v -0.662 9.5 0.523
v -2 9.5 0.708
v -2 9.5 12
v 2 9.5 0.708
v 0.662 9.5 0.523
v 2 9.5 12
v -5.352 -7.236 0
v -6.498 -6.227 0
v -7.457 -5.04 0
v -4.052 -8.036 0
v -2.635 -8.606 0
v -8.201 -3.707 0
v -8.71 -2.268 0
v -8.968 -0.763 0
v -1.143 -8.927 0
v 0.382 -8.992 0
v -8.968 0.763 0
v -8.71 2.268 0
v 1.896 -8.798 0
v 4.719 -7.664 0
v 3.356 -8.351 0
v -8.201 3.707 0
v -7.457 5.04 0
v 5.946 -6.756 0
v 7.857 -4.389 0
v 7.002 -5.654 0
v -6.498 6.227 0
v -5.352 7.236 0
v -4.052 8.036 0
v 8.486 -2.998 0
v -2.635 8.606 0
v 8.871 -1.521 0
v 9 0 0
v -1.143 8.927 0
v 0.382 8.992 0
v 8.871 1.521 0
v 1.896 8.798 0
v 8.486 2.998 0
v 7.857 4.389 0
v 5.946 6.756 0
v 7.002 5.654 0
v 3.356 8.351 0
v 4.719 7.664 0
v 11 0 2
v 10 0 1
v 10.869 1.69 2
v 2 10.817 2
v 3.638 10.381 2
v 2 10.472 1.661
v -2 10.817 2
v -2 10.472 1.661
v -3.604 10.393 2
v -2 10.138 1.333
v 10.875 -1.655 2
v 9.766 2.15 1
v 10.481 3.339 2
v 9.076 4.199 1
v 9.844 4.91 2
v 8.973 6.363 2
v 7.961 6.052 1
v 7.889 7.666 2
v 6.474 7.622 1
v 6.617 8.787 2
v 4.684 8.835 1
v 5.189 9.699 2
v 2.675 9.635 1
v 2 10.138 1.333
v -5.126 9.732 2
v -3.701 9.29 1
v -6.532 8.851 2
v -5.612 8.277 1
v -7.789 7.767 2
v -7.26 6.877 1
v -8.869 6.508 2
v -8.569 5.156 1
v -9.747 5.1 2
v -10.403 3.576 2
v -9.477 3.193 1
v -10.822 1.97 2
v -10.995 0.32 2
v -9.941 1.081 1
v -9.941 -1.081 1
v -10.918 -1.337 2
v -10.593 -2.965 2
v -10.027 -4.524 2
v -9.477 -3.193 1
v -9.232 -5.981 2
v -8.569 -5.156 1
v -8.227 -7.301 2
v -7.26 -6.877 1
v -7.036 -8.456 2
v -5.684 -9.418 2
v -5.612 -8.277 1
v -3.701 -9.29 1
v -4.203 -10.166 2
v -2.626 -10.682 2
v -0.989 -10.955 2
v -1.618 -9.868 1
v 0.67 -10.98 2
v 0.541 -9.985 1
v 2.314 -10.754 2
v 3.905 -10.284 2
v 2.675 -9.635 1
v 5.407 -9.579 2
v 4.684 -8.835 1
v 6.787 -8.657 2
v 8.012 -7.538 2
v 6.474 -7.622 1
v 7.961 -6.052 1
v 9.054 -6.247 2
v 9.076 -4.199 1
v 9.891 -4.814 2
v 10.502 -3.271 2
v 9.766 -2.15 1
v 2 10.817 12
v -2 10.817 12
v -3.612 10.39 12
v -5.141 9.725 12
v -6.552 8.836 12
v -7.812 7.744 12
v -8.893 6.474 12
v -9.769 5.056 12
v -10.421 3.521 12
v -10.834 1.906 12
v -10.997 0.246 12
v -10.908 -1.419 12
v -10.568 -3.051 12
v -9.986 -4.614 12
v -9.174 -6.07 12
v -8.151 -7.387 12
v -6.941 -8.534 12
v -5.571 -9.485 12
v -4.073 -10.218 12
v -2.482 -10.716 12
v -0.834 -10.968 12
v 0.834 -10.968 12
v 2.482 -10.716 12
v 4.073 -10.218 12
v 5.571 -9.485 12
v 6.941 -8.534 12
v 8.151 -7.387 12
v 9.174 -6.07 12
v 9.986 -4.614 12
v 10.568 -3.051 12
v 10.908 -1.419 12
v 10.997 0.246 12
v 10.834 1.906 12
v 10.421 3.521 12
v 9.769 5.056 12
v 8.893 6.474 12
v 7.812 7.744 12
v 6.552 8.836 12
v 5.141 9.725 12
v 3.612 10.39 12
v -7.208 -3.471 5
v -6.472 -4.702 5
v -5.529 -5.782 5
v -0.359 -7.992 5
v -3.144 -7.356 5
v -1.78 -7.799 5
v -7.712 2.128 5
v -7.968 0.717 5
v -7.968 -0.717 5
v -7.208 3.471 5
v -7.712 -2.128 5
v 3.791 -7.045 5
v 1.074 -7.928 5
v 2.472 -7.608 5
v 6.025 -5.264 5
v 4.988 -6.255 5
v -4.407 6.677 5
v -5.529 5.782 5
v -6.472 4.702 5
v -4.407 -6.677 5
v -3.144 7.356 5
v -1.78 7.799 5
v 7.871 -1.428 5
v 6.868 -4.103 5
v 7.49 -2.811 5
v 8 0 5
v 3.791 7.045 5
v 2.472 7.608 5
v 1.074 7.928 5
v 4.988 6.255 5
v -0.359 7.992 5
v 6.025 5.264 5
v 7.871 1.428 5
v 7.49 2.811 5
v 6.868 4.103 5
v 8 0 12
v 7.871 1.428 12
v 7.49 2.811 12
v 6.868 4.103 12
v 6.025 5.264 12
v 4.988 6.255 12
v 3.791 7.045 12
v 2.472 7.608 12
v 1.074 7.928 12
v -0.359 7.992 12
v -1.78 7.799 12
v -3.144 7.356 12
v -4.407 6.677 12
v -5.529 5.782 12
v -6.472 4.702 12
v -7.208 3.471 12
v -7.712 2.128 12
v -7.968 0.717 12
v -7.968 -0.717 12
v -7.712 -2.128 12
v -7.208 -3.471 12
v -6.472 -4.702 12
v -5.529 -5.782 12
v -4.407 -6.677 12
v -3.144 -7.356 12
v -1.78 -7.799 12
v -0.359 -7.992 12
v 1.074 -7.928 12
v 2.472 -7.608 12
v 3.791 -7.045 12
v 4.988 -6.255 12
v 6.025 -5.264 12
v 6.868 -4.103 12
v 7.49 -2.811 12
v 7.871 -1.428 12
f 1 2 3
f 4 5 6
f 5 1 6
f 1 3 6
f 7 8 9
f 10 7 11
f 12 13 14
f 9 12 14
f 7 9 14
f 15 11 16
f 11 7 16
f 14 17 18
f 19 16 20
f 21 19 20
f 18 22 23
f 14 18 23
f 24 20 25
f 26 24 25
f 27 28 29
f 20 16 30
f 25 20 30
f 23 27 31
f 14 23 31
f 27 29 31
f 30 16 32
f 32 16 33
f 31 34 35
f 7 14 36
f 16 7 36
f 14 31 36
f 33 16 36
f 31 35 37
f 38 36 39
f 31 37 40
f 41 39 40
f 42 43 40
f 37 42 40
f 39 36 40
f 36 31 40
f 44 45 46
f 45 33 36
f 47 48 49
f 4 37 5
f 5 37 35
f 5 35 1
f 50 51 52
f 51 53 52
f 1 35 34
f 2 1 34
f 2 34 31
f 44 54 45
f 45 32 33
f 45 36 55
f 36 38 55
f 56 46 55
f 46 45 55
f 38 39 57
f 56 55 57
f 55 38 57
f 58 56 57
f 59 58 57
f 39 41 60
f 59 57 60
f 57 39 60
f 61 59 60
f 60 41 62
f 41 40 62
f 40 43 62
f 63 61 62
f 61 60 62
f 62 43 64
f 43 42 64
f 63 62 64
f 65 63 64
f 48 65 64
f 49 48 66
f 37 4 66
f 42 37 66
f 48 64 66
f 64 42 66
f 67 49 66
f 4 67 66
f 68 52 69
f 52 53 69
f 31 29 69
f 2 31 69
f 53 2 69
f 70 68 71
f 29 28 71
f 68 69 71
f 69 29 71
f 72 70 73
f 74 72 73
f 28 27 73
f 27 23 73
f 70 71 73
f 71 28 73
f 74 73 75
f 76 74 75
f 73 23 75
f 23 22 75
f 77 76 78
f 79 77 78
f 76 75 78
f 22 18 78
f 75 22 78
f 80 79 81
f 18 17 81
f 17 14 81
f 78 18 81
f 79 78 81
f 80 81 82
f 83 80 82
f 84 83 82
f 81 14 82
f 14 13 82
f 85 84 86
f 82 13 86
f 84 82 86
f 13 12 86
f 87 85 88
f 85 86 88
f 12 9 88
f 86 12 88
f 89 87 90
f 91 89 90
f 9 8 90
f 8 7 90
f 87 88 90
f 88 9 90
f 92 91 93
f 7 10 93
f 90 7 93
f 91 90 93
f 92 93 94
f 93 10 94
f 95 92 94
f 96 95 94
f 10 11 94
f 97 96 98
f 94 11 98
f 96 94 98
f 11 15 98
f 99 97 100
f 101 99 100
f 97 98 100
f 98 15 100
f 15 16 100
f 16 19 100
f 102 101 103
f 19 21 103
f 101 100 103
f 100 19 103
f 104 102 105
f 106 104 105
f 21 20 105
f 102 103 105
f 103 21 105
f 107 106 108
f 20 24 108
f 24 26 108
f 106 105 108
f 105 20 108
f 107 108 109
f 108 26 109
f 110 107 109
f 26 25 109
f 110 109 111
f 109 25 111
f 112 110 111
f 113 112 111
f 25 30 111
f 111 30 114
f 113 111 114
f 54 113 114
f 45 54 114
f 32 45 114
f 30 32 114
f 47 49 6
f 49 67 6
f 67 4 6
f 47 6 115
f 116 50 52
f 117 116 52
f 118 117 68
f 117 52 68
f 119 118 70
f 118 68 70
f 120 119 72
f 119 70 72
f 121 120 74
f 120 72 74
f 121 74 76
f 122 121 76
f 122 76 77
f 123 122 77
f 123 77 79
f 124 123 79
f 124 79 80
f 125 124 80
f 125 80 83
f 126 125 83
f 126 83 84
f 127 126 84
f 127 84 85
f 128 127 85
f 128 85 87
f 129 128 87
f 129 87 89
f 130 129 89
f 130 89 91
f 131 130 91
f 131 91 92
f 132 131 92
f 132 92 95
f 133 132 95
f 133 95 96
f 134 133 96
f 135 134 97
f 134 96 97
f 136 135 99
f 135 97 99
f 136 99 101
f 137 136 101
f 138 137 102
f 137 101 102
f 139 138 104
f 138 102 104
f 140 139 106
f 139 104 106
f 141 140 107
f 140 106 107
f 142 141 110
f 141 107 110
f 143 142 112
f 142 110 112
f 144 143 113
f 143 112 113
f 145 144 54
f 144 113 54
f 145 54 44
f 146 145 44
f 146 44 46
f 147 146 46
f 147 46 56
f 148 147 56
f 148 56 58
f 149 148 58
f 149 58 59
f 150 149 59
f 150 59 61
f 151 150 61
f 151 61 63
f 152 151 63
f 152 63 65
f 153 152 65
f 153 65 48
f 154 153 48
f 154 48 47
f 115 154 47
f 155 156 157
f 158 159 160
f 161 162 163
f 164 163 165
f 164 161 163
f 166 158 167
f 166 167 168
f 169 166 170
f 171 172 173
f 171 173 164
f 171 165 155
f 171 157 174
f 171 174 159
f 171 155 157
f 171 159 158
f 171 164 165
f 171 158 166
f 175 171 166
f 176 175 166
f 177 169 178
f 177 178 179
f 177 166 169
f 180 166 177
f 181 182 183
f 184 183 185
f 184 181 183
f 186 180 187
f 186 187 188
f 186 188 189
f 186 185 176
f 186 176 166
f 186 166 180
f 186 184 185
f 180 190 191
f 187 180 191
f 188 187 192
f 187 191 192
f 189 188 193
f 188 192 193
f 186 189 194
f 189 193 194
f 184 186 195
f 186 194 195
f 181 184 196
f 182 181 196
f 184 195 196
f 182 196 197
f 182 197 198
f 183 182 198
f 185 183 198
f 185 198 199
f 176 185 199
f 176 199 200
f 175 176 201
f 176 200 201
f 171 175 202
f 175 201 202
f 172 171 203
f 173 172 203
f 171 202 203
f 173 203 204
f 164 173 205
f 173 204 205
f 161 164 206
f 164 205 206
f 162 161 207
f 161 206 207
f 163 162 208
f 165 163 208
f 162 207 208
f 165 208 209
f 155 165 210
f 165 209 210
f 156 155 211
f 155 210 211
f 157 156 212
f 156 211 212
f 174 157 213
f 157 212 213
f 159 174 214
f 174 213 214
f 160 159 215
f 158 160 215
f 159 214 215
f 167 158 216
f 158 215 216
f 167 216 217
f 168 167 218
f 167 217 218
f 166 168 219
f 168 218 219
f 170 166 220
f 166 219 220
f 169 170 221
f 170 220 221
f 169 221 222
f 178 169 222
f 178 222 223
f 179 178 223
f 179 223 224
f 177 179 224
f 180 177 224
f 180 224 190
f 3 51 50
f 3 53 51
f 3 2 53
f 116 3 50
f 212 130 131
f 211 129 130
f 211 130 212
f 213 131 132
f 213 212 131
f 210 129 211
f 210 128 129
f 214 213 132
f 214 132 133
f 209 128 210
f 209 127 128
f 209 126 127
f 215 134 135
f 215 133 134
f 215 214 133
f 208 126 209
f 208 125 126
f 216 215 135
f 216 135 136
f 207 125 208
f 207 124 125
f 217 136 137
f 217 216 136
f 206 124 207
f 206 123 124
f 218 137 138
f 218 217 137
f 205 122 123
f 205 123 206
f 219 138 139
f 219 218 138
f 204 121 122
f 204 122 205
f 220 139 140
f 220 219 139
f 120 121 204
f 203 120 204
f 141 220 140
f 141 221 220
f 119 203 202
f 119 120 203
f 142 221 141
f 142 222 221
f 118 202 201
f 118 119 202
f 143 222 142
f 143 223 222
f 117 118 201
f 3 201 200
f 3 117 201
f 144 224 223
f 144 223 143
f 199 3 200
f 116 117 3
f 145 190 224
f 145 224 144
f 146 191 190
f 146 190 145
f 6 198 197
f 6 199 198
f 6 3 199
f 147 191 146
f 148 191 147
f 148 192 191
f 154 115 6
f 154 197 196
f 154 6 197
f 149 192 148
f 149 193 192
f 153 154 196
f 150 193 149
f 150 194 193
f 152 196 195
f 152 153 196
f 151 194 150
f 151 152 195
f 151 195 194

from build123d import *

# Parameters (mm, degrees)
SKETCH1_R           = 11
BOSS_EXTRUDE1_DEPTH = 12
SKETCH2_R           = 8
CUT_EXTRUDE1_DEPTH  = 7
CHAMFER1_SIZE       = 2
SKETCH3_W           = 4
SKETCH3_H           = 3.288893808
CUT_EXTRUDE2_DEPTH  = 22


with BuildPart() as part:
    # Sketch1 → Boss-Extrude1 (new body)
    with BuildSketch(Plane.XY):
        Circle(SKETCH1_R)
    extrude(amount=BOSS_EXTRUDE1_DEPTH)

    # Sketch2 → Cut-Extrude1 (cut)
    with BuildSketch(Plane.XY.offset(12)):
        Circle(SKETCH2_R)
    extrude(amount=-CUT_EXTRUDE1_DEPTH, mode=Mode.SUBTRACT)

    # Chamfer1
    chamfer1_edges = [part.edges().sort_by_distance(p)[0] for p in [
        (-11, 0, 0),
    ]]
    chamfer(chamfer1_edges, length=CHAMFER1_SIZE)

    # Sketch3 → Cut-Extrude2 (cut)
    with BuildSketch(Plane.XY.offset(12)):
        with Locations((0, 11.144446904)):
            Rectangle(SKETCH3_W, SKETCH3_H)
    extrude(amount=-CUT_EXTRUDE2_DEPTH, mode=Mode.SUBTRACT)


solid = part.part
